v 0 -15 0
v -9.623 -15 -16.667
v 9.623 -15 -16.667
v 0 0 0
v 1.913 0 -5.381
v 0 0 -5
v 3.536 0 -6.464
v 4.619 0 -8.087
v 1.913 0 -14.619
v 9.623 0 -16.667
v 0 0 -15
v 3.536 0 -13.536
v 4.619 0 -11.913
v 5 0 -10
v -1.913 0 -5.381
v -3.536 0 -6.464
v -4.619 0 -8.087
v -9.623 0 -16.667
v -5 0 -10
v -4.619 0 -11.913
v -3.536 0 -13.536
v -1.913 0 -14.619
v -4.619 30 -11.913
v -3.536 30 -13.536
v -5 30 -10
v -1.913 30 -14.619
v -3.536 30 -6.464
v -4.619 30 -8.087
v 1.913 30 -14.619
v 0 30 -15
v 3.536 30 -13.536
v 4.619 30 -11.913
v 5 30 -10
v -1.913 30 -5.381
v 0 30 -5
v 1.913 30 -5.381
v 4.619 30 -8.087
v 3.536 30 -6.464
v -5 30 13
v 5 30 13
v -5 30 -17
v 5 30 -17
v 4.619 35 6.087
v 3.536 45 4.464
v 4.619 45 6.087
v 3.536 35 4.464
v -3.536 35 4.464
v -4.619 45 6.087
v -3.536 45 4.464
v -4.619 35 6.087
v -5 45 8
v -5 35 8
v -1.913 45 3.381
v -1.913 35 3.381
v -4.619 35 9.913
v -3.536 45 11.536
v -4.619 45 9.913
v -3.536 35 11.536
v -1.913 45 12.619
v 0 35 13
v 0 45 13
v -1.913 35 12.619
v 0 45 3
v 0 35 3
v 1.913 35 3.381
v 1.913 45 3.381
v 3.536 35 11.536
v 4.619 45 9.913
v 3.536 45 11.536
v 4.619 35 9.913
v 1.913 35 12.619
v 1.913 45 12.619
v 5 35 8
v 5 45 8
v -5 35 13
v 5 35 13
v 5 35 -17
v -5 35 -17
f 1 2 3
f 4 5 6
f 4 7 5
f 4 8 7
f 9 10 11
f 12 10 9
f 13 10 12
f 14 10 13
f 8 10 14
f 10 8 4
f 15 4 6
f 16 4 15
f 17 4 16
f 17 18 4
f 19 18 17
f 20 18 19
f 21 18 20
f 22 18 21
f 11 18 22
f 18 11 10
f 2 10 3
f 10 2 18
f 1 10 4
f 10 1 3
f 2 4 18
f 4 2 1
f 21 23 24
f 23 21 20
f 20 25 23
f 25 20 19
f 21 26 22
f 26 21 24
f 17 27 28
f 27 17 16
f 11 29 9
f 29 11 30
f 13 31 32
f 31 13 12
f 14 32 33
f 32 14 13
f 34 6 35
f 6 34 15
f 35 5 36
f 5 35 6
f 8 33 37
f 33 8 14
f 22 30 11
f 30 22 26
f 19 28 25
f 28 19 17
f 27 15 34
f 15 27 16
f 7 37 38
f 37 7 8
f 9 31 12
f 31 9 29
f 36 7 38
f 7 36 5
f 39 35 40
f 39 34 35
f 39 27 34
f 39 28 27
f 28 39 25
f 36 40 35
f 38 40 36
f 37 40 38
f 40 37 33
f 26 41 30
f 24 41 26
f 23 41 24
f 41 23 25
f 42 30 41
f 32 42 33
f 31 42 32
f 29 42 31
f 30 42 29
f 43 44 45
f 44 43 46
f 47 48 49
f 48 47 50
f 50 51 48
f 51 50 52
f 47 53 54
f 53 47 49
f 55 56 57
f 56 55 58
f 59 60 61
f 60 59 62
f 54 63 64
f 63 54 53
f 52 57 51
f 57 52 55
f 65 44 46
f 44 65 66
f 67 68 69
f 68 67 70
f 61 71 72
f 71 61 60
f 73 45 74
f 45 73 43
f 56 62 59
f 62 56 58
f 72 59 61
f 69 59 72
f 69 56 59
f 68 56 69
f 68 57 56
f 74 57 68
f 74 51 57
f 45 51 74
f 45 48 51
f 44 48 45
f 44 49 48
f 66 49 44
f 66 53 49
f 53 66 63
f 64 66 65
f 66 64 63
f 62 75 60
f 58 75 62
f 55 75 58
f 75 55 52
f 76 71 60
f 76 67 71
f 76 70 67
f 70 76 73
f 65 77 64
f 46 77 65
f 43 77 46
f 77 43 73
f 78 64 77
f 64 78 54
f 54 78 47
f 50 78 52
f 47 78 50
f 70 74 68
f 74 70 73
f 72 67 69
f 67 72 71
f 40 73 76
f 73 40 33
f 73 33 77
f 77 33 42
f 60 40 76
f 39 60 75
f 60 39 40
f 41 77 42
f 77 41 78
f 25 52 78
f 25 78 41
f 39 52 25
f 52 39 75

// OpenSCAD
// file: ../params.scad
// GLOBAL
hole_radius = 5;
peg_radius = 4.5;

// MAGNET
mag_height = 6.4;
mag_ring_ir = 50;
mag_ring_or = 102;
mag_count = 16;

// BEARING
bearing_height = 17;
bearing_ir = 33;
bearing_or = 44;

// STATOR
stator_height = 20;
stator_inner_height = 10;
stator_bearing_inset = (stator_height/2) - 1;
stator_count = 6;
stator_incidence = 360/stator_count;
stator_radius = 115;
stator_tab_width = 10;
stator_tab_offset = 50;
stator_wiring_gap = 25;
stator_wiring_gap_inset = stator_radius - (stator_wiring_gap + 10);
stator_outer_tab_extrude = 15;
stator_outer_tab_width = 30;
stator_notch = 15;
stator_notch_width = 5;
coil_edge = 80;

// ROTOR & ROTOR CAP
rotor_height = 10;
rotor_inner_height = 3;
rotor_radius = 105;
rotor_inner_diameter = 25;
rotor_count = 8;
rotor_incidence = 360/rotor_count;
rotor_tie_hole_offset = 30;
rotor_notch = 10;
rotor_notch_height = 2;

rotor_cap_radius = 50;
rotor_cap_peg_radius = 35;
rotor_cap_inner_radius = 10;
rotor_cap_height = 10;
rotor_cap_insert_height = 10;
rotor_cap_bearing_inset = (bearing_height + rotor_inner_height) - rotor_cap_height;
rotor_plate_height = 5;
blade_holder_edge = 20;

// ROTOR EDGE TIE
rotor_edge_tie_length = 40;
rotor_edge_tie_width = 20;
rotor_edge_tie_inner_height = 5;
rotor_edge_tie_height = 15;
rotor_edge_tie_peg_inset = 10;
// file: chuck.scad
include <../params.scad>


chuck_edge = coil_edge/2;

module chuck_whole() {
  difference() {
    translate([chuck_edge/-2, 0, 0])
      cube([chuck_edge, chuck_edge/1.2, stator_height]);
    rotate([0, 0, 120]) cube([chuck_edge, chuck_edge, stator_height]);
    mirror([0, 1, 0]) {
      rotate([0, 0, 300]) cube([chuck_edge, chuck_edge, stator_height]);
    }
  }
}

module chuck() {
  difference() {
    chuck_whole();
    translate([0, chuck_edge/4, 0]) scale([0.5, 0.5, 1]) chuck_whole();
    translate([chuck_edge/-2, chuck_edge/2, stator_height/2]) {
      rotate([90, 0, 90]) cylinder(h=chuck_edge, r=1);
    }
  }
}

chuck();
// main file
use <chuck.scad>


module handle() {
  rotate([90, 180, 0]) {
    scale([0.5, 0.5, 0.75]) chuck_whole();
    translate([0, 10, -30]) cylinder(h=30, r=5);
    translate([0, -8, -45]) cylinder(h=10, r=5);
  }
  translate([-5, 30, -17]) {
    cube([10, 5, 30]);
  }
}

handle();
